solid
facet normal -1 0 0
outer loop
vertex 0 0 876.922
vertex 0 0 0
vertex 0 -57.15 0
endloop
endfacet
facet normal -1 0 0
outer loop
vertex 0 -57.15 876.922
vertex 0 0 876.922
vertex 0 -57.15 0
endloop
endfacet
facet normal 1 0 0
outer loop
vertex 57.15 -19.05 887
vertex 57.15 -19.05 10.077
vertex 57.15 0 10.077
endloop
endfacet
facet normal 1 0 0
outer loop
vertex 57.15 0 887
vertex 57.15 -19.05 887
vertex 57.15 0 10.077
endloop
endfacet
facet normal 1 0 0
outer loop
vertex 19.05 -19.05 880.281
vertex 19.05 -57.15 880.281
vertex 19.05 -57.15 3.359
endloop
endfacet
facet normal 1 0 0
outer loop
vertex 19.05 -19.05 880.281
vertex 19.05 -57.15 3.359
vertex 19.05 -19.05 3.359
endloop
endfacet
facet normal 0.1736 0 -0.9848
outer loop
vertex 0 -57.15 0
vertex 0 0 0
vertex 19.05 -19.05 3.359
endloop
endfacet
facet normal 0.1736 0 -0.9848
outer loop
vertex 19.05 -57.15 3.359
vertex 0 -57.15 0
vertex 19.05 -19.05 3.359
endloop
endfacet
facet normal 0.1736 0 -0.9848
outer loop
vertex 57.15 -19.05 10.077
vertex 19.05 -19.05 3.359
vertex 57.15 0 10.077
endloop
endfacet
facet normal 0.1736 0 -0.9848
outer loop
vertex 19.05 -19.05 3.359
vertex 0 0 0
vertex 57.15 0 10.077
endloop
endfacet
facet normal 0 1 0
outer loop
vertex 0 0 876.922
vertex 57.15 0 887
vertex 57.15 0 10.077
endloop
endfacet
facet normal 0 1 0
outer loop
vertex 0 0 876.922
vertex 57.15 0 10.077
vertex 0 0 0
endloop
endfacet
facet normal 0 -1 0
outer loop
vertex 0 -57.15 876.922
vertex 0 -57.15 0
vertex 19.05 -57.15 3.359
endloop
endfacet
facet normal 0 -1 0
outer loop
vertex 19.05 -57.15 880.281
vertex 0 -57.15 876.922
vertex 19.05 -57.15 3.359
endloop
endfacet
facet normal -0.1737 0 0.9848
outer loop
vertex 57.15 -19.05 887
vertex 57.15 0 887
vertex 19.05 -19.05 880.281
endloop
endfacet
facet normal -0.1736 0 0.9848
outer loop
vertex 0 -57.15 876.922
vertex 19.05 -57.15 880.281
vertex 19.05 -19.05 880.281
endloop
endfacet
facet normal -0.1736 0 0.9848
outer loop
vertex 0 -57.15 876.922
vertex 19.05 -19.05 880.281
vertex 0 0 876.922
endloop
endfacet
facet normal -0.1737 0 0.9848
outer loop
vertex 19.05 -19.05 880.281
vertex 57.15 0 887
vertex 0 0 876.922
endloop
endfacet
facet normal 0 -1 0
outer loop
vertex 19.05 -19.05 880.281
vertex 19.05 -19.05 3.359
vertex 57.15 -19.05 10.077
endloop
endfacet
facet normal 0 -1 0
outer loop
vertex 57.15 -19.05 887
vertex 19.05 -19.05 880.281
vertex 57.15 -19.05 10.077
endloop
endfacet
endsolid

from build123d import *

# Parameters (mm, degrees)
F1_DEPTH = 1016
F3_DEPTH = 57.151


with BuildPart() as f1:
    # F0 (on Top) → F1 (new body)
    with BuildSketch(Plane.XY):
        Polygon((57.15, 0), (0, 0), (0, -57.15), (19.05, -57.15), (19.05, -19.05), (57.15, -19.05), align=None)
    extrude(amount=F1_DEPTH)

    # F2 (on face) → F3 (cut, through all)
    with BuildSketch(Plane(origin=(0, 0, 0), x_dir=(-1, 0, 0), z_dir=(0, 1, 0))):
        Polygon((-57.15, 0), (0, 0), (-57.15, 10.077087), align=None)
        Polygon((0, 876.922422), (0, 1016), (-57.15, 1016), (-57.15, 886.999509), align=None)
    extrude(amount=-F3_DEPTH, mode=Mode.SUBTRACT)


solid = f1.part
